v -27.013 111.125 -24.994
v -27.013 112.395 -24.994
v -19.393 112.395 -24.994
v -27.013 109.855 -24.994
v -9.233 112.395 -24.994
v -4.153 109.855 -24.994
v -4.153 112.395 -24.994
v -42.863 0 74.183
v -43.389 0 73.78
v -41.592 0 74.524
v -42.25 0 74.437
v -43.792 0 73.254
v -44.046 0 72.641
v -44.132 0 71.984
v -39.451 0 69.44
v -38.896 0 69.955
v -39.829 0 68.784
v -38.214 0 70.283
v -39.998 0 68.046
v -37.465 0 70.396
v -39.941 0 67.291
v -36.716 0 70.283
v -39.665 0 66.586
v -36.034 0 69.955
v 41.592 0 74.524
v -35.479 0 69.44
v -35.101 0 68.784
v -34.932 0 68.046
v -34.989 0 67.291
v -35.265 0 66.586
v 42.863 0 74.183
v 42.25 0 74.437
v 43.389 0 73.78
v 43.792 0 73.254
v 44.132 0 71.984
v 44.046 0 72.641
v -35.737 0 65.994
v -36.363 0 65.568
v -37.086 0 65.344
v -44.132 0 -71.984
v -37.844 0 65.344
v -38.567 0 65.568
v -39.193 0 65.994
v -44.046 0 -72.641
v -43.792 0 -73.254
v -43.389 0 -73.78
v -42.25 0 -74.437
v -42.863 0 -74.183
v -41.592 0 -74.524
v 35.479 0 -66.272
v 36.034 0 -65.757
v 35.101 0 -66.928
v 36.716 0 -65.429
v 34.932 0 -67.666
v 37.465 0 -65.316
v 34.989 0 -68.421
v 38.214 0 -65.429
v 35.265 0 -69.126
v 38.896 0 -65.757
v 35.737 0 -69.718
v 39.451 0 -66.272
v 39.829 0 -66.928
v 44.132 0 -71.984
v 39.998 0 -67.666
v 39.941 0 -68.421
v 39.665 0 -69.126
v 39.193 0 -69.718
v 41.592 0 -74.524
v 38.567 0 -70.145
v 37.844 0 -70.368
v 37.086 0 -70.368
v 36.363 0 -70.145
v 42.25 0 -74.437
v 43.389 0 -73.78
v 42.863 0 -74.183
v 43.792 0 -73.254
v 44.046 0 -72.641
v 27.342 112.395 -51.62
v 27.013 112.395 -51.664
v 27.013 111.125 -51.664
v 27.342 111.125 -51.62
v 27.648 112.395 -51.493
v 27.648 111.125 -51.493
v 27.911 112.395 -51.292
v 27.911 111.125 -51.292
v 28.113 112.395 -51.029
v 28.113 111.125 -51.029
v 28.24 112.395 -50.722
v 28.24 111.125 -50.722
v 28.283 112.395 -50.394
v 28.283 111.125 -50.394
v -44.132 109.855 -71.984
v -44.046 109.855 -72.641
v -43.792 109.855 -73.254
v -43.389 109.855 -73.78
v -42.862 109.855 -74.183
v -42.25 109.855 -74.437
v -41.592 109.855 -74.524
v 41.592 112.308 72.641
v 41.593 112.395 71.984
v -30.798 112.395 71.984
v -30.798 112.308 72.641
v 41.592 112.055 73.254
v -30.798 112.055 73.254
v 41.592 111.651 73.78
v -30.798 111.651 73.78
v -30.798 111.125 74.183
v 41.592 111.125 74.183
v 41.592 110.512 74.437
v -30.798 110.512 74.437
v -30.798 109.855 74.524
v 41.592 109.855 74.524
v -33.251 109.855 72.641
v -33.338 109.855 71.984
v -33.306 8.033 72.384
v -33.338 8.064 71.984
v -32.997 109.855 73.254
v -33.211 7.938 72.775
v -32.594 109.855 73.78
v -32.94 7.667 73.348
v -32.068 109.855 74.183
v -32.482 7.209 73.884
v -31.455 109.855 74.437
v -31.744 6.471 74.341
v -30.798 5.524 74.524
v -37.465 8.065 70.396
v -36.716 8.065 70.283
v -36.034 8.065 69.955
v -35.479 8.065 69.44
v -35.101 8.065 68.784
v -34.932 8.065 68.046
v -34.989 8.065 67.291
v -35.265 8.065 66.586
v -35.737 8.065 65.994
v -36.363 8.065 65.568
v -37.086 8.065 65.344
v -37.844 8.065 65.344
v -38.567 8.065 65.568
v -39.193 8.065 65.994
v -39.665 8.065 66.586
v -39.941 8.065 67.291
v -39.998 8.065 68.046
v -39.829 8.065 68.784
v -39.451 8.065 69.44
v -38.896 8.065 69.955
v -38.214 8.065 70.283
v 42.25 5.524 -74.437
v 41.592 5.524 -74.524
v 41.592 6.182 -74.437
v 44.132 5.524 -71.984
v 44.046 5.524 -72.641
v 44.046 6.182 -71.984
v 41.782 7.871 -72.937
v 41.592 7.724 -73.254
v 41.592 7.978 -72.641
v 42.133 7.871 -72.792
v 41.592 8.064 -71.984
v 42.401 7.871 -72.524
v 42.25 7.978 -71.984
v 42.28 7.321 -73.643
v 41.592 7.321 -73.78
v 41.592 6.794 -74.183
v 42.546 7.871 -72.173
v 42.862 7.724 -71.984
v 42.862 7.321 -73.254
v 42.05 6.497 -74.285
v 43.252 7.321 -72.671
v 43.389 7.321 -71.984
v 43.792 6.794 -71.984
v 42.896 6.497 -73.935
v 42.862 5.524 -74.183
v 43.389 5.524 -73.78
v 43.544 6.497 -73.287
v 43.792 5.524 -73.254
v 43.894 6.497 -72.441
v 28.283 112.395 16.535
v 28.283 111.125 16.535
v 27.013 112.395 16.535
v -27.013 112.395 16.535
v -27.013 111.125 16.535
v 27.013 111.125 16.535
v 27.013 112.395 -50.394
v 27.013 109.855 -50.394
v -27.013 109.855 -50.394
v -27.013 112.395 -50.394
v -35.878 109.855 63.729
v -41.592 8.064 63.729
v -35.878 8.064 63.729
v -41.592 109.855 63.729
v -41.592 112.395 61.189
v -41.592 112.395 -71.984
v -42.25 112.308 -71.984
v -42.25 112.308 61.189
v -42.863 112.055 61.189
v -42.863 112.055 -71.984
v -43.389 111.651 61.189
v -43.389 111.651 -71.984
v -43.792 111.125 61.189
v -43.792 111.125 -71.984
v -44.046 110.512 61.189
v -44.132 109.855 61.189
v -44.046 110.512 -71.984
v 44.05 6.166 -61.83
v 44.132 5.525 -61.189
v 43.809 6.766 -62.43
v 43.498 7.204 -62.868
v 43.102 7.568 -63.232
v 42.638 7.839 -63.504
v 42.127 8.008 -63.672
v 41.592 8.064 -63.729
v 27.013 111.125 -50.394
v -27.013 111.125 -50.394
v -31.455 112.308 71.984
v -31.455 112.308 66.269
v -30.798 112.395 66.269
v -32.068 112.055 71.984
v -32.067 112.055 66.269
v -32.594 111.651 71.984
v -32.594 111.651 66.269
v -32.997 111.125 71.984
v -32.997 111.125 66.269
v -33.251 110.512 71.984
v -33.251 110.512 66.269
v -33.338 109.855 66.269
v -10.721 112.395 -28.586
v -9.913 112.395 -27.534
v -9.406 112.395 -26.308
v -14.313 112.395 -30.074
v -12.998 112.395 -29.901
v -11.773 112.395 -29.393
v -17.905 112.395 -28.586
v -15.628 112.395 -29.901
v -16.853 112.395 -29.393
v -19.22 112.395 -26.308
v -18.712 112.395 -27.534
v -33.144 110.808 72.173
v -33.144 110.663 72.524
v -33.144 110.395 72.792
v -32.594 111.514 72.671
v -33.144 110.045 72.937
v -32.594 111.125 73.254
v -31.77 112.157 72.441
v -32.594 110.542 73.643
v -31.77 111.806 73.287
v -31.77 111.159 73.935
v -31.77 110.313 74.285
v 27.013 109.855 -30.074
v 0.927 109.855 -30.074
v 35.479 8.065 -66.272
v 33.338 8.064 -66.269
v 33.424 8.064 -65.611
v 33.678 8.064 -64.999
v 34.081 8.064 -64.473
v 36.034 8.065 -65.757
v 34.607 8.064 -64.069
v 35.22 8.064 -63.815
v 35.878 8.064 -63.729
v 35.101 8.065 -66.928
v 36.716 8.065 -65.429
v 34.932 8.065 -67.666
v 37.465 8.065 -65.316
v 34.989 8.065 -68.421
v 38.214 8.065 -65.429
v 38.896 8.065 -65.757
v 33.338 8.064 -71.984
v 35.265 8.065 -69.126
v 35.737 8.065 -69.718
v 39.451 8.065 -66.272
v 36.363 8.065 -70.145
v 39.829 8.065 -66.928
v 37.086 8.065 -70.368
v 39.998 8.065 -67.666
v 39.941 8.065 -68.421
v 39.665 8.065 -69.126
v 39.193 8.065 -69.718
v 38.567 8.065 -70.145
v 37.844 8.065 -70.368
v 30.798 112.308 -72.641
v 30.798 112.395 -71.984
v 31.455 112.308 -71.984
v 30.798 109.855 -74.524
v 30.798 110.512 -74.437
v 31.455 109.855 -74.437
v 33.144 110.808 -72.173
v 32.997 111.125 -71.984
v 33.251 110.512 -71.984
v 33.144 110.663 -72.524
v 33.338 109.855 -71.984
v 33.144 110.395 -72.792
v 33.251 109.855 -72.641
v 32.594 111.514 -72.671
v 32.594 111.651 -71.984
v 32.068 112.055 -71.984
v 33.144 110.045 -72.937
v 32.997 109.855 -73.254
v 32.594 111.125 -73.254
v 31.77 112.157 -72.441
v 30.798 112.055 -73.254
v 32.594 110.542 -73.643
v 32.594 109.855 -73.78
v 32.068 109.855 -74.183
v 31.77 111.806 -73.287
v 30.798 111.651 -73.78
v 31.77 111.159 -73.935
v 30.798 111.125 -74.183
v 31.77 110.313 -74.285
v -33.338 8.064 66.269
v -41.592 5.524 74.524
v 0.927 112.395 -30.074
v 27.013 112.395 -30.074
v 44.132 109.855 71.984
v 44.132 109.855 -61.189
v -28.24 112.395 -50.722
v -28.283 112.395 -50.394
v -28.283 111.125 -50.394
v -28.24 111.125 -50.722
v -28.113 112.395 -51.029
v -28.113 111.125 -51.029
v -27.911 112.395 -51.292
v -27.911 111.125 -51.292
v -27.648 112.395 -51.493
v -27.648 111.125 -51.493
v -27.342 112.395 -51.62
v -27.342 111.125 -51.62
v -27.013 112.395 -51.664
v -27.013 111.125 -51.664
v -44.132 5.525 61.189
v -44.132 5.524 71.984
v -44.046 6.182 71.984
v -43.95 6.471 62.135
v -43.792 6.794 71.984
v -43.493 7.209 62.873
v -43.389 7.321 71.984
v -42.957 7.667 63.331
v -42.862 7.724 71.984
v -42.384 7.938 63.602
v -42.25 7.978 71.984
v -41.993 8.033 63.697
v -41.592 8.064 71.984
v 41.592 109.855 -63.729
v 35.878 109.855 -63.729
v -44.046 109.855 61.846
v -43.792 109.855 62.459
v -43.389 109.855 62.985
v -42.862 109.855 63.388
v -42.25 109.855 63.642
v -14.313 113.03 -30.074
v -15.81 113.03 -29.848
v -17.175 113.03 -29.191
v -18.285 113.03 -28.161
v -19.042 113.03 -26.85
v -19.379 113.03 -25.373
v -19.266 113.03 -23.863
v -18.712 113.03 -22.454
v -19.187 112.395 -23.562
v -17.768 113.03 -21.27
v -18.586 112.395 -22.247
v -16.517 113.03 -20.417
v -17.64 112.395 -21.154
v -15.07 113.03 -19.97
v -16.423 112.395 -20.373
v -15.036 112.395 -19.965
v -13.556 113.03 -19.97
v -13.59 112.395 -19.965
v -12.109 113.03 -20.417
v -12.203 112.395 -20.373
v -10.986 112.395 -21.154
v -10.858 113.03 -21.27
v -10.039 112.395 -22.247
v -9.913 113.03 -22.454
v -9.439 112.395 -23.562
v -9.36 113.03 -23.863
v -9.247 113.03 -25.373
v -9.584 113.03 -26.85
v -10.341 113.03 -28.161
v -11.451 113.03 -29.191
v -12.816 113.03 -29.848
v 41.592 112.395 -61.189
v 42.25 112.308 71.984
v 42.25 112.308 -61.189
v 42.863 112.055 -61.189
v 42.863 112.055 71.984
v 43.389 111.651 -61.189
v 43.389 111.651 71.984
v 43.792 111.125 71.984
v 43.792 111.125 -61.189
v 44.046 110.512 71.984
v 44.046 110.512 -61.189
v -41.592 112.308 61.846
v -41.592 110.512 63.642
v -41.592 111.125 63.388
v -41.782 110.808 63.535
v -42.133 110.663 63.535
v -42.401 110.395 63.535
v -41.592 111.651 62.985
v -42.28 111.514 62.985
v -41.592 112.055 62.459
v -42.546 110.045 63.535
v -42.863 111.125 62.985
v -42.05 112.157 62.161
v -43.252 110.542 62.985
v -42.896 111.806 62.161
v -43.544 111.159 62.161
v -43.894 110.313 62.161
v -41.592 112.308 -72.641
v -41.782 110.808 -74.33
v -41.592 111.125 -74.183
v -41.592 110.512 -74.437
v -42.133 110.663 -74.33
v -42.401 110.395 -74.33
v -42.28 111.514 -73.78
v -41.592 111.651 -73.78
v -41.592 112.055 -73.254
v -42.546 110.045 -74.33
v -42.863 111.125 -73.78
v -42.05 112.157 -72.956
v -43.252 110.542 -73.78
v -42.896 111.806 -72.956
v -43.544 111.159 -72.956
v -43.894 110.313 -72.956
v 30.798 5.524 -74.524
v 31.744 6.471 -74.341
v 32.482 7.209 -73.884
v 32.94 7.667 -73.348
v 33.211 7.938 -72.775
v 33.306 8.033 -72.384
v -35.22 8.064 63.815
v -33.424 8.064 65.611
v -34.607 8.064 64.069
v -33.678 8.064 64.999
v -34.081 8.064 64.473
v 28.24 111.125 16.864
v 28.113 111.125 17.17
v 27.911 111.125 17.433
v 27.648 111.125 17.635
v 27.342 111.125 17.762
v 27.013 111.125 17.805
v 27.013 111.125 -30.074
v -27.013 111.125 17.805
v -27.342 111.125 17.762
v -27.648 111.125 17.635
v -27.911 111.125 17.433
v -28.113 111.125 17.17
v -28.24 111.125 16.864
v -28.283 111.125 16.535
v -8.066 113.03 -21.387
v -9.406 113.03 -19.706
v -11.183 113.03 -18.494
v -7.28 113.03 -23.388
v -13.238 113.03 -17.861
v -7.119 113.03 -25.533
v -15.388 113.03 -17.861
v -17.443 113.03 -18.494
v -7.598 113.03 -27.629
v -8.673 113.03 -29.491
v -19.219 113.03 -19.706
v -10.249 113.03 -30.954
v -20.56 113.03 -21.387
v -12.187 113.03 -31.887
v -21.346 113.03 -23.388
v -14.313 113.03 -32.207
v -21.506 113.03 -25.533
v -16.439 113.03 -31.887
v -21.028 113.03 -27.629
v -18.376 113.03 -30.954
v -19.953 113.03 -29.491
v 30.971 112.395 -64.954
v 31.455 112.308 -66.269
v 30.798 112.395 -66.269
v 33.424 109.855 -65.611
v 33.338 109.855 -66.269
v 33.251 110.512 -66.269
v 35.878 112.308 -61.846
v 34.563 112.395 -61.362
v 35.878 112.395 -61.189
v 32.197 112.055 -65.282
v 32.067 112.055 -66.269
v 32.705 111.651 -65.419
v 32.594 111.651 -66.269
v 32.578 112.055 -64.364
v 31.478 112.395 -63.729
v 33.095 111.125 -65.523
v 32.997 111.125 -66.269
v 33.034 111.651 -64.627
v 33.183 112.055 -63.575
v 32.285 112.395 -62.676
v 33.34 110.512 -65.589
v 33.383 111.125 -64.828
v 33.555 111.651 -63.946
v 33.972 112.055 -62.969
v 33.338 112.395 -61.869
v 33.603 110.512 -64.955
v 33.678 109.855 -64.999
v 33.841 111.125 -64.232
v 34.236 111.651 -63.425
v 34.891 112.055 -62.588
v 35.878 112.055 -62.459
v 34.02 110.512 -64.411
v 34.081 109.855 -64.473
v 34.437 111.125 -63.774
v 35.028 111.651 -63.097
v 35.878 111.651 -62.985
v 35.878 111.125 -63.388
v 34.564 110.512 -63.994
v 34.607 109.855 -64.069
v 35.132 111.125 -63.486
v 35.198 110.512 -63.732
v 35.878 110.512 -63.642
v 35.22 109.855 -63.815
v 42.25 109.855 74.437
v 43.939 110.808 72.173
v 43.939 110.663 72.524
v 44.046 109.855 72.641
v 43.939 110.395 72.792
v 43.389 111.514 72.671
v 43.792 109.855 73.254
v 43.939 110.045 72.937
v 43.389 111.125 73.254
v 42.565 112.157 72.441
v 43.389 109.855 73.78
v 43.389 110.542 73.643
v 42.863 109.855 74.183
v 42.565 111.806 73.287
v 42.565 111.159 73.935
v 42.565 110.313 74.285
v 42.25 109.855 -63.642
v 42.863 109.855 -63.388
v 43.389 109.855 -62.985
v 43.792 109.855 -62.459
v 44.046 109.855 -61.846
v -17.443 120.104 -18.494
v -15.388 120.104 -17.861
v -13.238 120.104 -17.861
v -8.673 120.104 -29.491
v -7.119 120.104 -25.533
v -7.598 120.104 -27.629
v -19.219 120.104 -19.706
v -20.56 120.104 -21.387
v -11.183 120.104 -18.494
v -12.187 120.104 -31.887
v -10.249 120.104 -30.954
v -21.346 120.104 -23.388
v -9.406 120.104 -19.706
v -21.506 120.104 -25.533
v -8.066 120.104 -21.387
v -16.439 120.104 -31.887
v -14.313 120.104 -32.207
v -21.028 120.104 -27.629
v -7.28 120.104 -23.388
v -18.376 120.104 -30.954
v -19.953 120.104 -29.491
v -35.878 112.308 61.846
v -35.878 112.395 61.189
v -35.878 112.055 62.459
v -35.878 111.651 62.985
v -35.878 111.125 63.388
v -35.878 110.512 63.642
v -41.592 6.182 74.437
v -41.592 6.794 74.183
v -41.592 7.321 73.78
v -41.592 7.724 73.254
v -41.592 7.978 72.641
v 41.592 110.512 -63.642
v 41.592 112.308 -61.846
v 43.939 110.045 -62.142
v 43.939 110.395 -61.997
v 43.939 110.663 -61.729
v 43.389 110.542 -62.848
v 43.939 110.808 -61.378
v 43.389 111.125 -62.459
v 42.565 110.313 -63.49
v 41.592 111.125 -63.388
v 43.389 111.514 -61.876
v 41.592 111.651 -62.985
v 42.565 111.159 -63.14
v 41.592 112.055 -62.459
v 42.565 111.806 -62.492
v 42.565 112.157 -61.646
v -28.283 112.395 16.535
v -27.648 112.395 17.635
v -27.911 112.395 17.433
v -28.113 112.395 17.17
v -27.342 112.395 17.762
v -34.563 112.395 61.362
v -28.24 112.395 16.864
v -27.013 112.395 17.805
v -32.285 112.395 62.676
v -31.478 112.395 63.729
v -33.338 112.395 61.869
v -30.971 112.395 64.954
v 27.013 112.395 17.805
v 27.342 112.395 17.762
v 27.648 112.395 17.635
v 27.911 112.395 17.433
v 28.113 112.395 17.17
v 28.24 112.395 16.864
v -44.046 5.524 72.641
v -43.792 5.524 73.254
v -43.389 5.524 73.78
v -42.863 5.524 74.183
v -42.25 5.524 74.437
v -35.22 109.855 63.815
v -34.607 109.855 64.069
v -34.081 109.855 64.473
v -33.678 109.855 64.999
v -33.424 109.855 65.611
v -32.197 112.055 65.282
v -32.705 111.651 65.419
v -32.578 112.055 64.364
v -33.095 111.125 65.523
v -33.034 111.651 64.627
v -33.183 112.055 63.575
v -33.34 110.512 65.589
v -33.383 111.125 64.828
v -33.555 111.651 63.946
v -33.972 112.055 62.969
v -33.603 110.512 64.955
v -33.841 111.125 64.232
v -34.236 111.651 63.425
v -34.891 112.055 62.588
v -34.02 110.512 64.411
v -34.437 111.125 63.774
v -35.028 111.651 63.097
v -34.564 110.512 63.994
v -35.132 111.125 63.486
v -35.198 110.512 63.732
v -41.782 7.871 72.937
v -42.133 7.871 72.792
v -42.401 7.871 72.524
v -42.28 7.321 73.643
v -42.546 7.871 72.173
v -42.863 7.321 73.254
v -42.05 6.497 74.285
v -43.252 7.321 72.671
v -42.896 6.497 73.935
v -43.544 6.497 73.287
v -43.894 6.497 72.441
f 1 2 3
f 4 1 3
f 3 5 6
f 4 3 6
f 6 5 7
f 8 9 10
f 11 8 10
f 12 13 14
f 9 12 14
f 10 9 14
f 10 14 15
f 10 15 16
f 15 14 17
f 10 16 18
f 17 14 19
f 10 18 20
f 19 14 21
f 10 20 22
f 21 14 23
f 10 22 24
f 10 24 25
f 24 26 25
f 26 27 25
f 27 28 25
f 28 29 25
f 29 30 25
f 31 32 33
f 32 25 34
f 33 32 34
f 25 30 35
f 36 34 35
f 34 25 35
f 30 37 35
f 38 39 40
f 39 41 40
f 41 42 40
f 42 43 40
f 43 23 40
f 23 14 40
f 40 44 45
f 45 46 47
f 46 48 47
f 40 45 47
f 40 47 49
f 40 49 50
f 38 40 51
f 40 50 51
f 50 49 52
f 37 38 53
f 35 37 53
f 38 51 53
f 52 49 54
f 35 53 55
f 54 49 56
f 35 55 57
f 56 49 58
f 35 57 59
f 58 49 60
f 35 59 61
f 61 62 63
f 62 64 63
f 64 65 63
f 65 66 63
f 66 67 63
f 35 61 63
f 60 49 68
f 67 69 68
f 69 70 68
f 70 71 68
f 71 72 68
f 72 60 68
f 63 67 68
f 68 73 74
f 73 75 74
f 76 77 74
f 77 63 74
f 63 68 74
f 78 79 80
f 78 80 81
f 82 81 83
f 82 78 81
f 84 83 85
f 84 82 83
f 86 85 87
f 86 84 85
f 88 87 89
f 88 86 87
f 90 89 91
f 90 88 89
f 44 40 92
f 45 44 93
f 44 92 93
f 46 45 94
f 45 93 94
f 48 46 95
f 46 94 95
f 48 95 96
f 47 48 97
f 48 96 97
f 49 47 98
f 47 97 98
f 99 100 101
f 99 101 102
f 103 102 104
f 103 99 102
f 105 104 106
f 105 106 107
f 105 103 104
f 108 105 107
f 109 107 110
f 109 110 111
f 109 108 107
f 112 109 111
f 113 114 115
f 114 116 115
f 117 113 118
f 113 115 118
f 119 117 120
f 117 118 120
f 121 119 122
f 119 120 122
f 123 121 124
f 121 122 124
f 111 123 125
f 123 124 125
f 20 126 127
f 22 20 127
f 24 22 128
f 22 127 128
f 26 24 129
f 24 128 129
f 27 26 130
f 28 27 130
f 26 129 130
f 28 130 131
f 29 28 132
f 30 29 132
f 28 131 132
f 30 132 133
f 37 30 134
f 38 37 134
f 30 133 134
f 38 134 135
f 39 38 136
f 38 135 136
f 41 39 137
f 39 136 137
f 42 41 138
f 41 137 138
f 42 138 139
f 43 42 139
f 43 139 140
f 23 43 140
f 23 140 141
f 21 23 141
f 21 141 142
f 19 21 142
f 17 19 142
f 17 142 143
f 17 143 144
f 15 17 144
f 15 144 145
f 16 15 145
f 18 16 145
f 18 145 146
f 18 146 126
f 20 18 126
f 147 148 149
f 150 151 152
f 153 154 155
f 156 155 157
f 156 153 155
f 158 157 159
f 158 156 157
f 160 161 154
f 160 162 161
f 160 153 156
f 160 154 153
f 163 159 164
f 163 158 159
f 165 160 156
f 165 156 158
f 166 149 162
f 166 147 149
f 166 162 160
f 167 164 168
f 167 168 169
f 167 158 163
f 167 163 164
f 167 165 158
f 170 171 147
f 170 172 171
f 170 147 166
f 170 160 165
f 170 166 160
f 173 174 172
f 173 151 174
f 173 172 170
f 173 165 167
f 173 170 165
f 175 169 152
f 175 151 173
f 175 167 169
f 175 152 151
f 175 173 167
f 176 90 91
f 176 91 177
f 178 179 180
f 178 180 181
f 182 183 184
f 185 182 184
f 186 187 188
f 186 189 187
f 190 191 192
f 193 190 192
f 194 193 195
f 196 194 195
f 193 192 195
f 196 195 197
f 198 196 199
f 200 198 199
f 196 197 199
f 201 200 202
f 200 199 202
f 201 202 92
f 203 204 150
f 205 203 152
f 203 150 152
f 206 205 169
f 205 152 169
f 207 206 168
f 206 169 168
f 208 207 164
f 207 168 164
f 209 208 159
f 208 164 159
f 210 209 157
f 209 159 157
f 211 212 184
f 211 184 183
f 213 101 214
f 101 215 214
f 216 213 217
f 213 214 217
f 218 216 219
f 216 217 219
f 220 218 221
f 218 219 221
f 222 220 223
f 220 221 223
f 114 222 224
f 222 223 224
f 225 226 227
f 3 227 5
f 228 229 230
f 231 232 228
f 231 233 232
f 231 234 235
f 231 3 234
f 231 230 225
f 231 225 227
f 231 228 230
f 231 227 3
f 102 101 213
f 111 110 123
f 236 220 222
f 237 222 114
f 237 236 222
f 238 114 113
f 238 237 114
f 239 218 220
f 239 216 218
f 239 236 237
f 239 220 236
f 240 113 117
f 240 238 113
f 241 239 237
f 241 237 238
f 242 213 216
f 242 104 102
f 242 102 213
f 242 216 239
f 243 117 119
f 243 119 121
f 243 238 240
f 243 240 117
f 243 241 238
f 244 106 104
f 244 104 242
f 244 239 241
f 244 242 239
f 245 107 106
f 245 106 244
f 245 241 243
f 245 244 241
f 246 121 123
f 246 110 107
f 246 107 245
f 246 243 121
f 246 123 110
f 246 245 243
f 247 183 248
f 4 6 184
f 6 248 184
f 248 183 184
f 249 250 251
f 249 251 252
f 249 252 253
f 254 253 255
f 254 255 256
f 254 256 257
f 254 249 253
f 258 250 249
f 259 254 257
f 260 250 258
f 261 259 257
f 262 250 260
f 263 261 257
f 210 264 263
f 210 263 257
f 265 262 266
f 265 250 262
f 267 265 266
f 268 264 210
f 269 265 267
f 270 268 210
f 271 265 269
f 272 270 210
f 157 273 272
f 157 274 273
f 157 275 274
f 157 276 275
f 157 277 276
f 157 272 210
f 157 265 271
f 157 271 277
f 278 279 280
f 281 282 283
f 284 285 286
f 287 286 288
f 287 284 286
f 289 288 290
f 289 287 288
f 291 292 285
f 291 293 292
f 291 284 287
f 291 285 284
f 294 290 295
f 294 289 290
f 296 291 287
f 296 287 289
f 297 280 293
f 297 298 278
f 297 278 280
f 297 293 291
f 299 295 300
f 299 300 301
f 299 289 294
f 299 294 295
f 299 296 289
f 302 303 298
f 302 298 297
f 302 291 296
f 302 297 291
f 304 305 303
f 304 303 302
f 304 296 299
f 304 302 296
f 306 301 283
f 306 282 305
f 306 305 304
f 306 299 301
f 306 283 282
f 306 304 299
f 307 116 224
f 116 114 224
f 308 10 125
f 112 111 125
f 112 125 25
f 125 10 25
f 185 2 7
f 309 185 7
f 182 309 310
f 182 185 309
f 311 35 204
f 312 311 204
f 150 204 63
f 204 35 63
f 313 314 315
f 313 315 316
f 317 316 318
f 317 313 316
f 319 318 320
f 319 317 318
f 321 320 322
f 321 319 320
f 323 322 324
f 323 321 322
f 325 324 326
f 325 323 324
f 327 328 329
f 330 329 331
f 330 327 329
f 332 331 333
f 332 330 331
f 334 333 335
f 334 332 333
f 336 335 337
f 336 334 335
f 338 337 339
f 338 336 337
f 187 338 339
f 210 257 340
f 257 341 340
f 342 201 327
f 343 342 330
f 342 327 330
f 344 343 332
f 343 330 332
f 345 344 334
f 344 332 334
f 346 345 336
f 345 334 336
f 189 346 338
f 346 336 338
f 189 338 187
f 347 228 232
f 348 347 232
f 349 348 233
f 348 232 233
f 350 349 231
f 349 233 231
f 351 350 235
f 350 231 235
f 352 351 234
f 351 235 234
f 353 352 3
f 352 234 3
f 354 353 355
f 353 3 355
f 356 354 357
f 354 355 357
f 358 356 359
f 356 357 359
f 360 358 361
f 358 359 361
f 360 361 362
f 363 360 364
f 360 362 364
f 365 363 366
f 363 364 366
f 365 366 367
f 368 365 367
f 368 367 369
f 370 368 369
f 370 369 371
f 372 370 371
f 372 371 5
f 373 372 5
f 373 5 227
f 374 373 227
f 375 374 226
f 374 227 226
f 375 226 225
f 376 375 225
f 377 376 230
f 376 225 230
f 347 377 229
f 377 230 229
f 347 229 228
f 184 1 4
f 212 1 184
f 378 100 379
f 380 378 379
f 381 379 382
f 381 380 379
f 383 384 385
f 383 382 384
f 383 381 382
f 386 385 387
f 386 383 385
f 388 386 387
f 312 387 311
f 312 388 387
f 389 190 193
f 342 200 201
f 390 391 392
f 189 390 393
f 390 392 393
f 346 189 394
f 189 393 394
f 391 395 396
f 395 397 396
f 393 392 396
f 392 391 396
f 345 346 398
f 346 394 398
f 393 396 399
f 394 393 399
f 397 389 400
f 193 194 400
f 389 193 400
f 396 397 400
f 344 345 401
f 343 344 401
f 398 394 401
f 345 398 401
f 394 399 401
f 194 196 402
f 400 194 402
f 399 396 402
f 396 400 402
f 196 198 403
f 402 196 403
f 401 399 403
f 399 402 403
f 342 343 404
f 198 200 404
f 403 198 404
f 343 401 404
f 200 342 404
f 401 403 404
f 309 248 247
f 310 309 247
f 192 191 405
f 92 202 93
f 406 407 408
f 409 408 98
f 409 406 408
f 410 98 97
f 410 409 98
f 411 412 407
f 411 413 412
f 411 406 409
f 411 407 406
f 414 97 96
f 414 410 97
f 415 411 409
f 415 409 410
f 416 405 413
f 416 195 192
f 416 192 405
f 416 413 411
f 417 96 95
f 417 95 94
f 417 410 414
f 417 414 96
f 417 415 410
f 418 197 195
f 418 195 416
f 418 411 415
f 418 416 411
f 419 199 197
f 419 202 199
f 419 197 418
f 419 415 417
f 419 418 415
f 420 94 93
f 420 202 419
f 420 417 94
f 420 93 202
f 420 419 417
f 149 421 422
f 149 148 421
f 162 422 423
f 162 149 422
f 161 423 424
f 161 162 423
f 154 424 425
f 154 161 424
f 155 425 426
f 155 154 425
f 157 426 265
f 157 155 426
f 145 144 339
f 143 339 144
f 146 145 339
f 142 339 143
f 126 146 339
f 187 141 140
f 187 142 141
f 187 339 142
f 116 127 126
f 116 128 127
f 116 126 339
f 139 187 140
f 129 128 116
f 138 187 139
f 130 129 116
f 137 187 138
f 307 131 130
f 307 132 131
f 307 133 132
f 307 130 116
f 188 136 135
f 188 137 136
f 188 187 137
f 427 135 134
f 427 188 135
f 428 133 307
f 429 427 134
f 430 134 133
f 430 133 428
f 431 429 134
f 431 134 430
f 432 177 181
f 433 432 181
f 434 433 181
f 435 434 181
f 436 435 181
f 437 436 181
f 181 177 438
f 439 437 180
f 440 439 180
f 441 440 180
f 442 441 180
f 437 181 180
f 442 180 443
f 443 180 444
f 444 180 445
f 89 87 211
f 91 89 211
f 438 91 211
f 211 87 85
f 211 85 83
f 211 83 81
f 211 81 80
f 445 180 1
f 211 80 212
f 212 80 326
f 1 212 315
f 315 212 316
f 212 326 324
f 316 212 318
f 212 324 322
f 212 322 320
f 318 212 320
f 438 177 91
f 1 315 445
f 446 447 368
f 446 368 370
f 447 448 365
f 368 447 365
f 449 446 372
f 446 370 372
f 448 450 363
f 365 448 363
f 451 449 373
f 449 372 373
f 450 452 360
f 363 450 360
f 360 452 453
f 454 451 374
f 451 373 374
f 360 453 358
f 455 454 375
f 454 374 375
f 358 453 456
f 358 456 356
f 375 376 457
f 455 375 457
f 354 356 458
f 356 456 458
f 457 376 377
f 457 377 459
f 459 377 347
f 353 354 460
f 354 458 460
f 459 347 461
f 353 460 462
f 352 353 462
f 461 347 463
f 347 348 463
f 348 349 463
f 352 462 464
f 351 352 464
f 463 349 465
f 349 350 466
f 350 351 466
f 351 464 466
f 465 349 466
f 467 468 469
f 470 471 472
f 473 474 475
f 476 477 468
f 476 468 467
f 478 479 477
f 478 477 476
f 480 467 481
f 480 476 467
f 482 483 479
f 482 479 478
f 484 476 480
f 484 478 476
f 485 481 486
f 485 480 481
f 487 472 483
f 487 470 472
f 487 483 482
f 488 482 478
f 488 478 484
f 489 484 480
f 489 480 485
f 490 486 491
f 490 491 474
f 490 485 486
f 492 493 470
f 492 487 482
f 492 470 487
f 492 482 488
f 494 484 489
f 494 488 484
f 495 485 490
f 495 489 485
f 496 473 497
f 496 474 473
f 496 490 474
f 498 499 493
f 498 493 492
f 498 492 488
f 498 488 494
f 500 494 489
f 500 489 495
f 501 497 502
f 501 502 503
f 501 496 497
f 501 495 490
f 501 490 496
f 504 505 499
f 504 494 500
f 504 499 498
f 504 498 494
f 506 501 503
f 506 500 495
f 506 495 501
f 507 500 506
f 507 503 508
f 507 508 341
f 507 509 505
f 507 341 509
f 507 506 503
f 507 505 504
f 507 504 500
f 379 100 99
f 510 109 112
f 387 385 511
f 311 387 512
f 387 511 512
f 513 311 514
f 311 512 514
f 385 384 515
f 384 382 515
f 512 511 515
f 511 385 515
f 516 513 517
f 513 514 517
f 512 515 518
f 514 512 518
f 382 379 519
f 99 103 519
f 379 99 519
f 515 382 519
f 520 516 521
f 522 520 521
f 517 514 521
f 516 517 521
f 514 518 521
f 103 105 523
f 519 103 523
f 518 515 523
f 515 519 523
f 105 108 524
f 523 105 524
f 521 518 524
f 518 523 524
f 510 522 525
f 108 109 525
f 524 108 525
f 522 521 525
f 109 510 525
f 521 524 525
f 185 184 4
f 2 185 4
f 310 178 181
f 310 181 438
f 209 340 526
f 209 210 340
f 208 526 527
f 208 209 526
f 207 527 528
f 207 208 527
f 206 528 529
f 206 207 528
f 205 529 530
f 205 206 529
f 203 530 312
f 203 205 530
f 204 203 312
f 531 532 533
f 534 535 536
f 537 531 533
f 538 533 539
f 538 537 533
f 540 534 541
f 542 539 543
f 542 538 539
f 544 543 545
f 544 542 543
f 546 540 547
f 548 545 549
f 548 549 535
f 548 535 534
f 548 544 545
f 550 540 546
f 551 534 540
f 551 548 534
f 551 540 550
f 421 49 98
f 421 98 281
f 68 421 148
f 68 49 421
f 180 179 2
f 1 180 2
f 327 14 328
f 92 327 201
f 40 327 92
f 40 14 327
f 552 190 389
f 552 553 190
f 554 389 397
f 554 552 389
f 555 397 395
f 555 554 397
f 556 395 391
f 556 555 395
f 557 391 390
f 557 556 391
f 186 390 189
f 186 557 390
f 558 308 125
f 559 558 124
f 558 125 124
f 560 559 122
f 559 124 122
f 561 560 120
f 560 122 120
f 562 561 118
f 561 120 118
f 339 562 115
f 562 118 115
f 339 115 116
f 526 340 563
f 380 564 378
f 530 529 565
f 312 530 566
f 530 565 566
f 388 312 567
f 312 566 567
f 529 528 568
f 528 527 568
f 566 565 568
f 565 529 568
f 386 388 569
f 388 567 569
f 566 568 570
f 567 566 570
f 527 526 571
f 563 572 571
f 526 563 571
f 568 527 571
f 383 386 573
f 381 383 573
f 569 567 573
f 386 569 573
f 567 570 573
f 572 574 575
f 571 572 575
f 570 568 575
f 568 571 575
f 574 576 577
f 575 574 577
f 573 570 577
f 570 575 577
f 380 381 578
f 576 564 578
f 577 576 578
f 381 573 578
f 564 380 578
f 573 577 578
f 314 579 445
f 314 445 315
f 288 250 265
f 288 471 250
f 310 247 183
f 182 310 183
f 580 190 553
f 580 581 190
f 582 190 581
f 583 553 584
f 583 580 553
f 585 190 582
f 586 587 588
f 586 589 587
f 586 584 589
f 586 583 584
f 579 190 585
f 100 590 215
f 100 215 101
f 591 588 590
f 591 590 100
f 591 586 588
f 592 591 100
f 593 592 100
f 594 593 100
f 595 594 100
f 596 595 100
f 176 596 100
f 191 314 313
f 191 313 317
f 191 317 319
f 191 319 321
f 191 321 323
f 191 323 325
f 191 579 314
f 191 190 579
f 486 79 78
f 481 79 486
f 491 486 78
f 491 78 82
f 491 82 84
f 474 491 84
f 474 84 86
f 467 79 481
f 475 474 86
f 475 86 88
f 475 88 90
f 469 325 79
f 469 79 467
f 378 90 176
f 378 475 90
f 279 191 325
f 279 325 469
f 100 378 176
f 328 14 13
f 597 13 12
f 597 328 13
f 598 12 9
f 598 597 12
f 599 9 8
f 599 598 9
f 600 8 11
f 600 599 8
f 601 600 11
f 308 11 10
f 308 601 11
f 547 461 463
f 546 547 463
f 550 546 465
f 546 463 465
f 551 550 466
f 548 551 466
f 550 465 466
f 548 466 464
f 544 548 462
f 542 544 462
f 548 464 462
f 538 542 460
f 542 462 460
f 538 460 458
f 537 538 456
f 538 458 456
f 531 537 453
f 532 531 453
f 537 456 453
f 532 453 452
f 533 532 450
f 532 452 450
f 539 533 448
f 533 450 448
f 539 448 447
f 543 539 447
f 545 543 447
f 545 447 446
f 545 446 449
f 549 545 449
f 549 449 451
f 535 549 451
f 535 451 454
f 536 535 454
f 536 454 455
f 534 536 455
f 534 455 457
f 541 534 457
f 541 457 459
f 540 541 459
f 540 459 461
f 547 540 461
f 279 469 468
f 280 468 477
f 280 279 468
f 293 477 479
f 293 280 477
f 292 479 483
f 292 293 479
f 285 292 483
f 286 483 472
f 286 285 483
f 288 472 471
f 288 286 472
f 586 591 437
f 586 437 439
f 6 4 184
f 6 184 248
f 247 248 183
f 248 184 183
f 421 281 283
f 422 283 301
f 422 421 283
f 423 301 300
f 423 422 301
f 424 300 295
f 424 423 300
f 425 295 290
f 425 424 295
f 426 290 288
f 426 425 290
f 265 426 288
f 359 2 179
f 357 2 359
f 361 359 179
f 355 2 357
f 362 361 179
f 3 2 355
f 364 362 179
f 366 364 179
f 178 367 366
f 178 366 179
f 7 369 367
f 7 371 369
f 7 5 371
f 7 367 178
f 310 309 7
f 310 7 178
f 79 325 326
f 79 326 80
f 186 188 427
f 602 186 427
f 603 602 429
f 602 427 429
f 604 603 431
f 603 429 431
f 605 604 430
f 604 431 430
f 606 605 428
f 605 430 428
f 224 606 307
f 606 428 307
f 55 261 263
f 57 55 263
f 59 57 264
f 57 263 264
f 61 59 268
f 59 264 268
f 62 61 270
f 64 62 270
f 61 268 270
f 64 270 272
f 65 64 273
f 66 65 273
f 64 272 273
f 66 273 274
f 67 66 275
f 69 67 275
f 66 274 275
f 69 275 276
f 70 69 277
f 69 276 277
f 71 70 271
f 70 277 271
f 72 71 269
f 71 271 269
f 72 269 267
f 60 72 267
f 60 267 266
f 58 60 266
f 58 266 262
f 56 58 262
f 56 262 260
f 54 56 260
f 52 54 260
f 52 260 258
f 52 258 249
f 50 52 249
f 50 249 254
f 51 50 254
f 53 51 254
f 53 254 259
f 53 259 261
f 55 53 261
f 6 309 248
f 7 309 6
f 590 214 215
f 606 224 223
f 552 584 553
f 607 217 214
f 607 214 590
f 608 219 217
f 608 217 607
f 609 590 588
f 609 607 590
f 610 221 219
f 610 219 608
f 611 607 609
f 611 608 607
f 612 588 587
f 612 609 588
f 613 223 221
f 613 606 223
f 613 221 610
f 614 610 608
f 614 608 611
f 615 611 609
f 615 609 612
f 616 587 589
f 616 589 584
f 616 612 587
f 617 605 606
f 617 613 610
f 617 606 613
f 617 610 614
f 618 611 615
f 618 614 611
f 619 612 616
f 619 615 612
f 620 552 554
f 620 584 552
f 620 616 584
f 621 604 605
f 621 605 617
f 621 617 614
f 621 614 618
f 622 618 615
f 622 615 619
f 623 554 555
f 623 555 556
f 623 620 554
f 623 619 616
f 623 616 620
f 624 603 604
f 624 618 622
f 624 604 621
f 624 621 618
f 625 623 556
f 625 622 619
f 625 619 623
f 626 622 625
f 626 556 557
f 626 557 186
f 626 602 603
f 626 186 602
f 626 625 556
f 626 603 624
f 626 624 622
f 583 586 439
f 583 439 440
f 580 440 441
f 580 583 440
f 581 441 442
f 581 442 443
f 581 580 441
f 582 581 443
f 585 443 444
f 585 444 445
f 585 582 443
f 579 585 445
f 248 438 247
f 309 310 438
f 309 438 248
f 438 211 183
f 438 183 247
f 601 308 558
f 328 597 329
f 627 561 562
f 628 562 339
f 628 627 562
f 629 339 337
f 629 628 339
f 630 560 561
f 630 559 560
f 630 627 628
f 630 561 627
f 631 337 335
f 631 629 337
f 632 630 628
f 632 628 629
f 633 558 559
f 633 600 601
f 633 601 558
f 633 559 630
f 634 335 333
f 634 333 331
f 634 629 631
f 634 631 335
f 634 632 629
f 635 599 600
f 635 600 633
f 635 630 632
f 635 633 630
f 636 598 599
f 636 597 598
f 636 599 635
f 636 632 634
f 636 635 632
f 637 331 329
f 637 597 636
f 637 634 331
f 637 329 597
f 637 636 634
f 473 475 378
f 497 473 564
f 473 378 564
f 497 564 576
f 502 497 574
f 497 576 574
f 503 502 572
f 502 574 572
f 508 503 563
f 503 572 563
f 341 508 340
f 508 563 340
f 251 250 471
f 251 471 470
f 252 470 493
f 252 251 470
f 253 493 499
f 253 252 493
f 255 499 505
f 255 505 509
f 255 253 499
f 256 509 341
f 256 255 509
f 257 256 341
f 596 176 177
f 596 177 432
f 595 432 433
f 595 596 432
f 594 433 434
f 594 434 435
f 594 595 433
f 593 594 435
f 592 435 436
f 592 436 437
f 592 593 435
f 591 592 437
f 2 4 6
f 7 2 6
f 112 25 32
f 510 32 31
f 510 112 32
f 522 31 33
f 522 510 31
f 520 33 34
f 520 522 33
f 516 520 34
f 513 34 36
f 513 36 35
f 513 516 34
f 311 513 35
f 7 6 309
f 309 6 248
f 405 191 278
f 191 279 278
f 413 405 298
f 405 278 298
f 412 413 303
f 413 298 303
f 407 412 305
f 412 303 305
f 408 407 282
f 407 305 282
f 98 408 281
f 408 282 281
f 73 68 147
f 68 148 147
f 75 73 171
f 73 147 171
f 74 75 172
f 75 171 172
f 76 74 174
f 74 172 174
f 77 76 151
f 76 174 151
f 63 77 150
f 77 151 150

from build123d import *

# Parameters (mm, degrees)
SKETCH1_W           = 88.265
SKETCH1_H           = 149.0472
BOSS_EXTRUDE1_DEPTH = 112.395
SKETCH2_W           = 10.795
SKETCH2_H           = 10.795
CUT_EXTRUDE1_DEPTH  = 104.3305
SKETCH3_W           = 54.0258
SKETCH3_H           = 66.929
CUT_EXTRUDE2_DEPTH  = 1.27
SKETCH4_R           = 7.2136
SKETCH4_R_2         = 5.08
BOSS_EXTRUDE2_DEPTH = 7.7089
CUT_EXTRUDE5_START  = -7.7089
SKETCH7_R           = 7.2136
SKETCH7_R_2         = 5.08
CUT_EXTRUDE5_DEPTH  = 0.635
FILLET1_R           = 2.54
CUT_EXTRUDE6_DEPTH  = 2.54
BOSS_EXTRUDE3_DEPTH = 2.54
SKETCH10_R          = 2.54
CUT_EXTRUDE7_DEPTH  = 142.613105557


with BuildPart() as part:
    # Sketch1 → Boss-Extrude1 (new body)
    with BuildSketch(Plane(origin=(0, 0, 0), x_dir=(1, 0, 0), z_dir=(0, 1, 0))):
        Rectangle(SKETCH1_W, SKETCH1_H)
    extrude(amount=BOSS_EXTRUDE1_DEPTH)

    # Sketch2 → Cut-Extrude1 (cut)
    with BuildSketch(Plane(origin=(0, 112.395, 0), x_dir=(1, 0, 0), z_dir=(0, 1, 0))):
        with Locations((-38.735, -69.1261)):
            Rectangle(SKETCH2_W, SKETCH2_H)
        with Locations((38.735, 69.1261)):
            Rectangle(SKETCH2_W, SKETCH2_H)
    extrude(amount=-CUT_EXTRUDE1_DEPTH, mode=Mode.SUBTRACT)

    # Sketch3 → Cut-Extrude2 (cut)
    with BuildSketch(Plane(origin=(0, 112.395, 0), x_dir=(1, 0, 0), z_dir=(0, 1, 0))):
        with BuildLine():
            Line((-27.0129, 51.6636), (27.0129, 51.6636))
            ThreePointArc((27.0129, 51.6636), (27.910925612, 51.291625612), (28.2829, 50.3936))
            Line((28.2829, 50.3936), (28.2829, -16.5354))
            ThreePointArc((28.2829, -16.5354), (27.910925612, -17.433425612), (27.0129, -17.8054))
            Line((27.0129, -17.8054), (-27.0129, -17.8054))
            ThreePointArc((-27.0129, -17.8054), (-27.910925612, -17.433425612), (-28.2829, -16.5354))
            Line((-28.2829, -16.5354), (-28.2829, 50.3936))
            ThreePointArc((-28.2829, 50.3936), (-27.910925612, 51.291625612), (-27.0129, 51.6636))
        make_face()
        with Locations((0, 16.9291)):
            Rectangle(SKETCH3_W, SKETCH3_H, mode=Mode.SUBTRACT)
    extrude(amount=-CUT_EXTRUDE2_DEPTH, mode=Mode.SUBTRACT)

    # Sketch4 → Boss-Extrude2 (add)
    # profile 1 of 2: a face of its own
    with BuildSketch(Plane(origin=(0, 112.395, 0), x_dir=(1, 0, 0), z_dir=(0, 1, 0))):
        with Locations(Location((-14.3129, 24.9936, 0), (0, 0, 90))):
            Circle(SKETCH4_R)
        with Locations((-14.3129, 24.9936)):
            Circle(SKETCH4_R_2, mode=Mode.SUBTRACT)
    # profile 2 of 2: a face of its own
    with BuildSketch(Plane(origin=(0, 112.395, 0), x_dir=(1, 0, 0), z_dir=(0, 1, 0))):
        with Locations((-14.3129, 24.9936)):
            Circle(SKETCH4_R_2)
    extrude(amount=BOSS_EXTRUDE2_DEPTH)

    # Sketch7 → Cut-Extrude5 (cut)
    with BuildSketch(Plane(origin=(0, 120.1039, 0), x_dir=(1, 0, 0), z_dir=(0, 1, 0)).offset(CUT_EXTRUDE5_START)):
        with Locations(Location((-14.3129, 24.9936, 0), (0, 0, 90))):
            Circle(SKETCH7_R)
        with Locations(Location((-14.3129, 24.9936, 0), (0, 0, 90))):
            Circle(SKETCH7_R_2, mode=Mode.SUBTRACT)
    extrude(amount=CUT_EXTRUDE5_DEPTH, mode=Mode.SUBTRACT)

    # Fillet1
    fillet1_edges = [part.edges().sort_by_distance(p)[0] for p in [
        (-44.1325, 112.395, -5.3975),
        (-5.3975, 112.395, -74.5236),
        (5.3975, 112.395, 74.5236),
        (-44.1325, 4.03225, 74.5236),
        (44.1325, 4.03225, -74.5236),
        (-33.3375, 112.395, 69.1261),
        (-38.735, 112.395, 63.7286),
        (-38.735, 8.0645, 74.5236),
        (-33.3375, 60.22975, 74.5236),
        (-33.3375, 60.22975, 63.7286),
        (-44.1325, 60.22975, 63.7286),
        (-44.1325, 8.0645, 69.1261),
        (33.3375, 112.395, -69.1261),
        (38.735, 112.395, -63.7286),
        (38.735, 8.0645, -74.5236),
        (33.3375, 60.22975, -74.5236),
        (33.3375, 60.22975, -63.7286),
        (44.1325, 60.22975, -63.7286),
        (44.1325, 8.0645, -69.1261),
        (44.1325, 112.395, 5.3975),
        (44.1325, 56.1975, 74.5236),
        (-44.1325, 56.1975, -74.5236),
    ]]
    fillet(fillet1_edges, radius=FILLET1_R)

    # Sketch8 → Cut-Extrude6 (cut)
    with BuildSketch(Plane(origin=(0, 112.395, 0), x_dir=(1, 0, 0), z_dir=(0, 1, 0))):
        Polygon((-14.3129, 24.9936), (-27.0129, 24.9936), (-27.0129, 50.3936), (27.0129, 50.3936), (27.0129, 30.0736), (0.9271, 30.0736), (-4.1529, 24.9936), align=None)
    extrude(amount=-CUT_EXTRUDE6_DEPTH, mode=Mode.SUBTRACT)

    # Sketch10 → Cut-Extrude7 (cut, through all)
    with BuildSketch(Plane(origin=(0, 8.0645, 0), x_dir=(1, 0, 0), z_dir=(0, 1, 0))):
        with Locations(Location((-37.465, -67.8561, 0), (0, 0, 270))):
            Circle(SKETCH10_R)
        with Locations(Location((37.465, 67.8561, 0), (0, 0, 270))):
            Circle(SKETCH10_R)
    extrude(amount=-CUT_EXTRUDE7_DEPTH, mode=Mode.SUBTRACT)


with BuildPart() as body_2:
    # Sketch9 → Boss-Extrude3 (new body)
    with BuildSketch(Plane(origin=(0, 109.855, 0), x_dir=(1, 0, 0), z_dir=(0, 1, 0))):
        Polygon((-27.0129, 24.9936), (-4.1529, 24.9936), (0.9271, 30.0736), (27.0129, 30.0736), (27.0129, 50.3936), (-27.0129, 50.3936), align=None)
    extrude(amount=BOSS_EXTRUDE3_DEPTH)


solid = Compound([part.part, body_2.part])
